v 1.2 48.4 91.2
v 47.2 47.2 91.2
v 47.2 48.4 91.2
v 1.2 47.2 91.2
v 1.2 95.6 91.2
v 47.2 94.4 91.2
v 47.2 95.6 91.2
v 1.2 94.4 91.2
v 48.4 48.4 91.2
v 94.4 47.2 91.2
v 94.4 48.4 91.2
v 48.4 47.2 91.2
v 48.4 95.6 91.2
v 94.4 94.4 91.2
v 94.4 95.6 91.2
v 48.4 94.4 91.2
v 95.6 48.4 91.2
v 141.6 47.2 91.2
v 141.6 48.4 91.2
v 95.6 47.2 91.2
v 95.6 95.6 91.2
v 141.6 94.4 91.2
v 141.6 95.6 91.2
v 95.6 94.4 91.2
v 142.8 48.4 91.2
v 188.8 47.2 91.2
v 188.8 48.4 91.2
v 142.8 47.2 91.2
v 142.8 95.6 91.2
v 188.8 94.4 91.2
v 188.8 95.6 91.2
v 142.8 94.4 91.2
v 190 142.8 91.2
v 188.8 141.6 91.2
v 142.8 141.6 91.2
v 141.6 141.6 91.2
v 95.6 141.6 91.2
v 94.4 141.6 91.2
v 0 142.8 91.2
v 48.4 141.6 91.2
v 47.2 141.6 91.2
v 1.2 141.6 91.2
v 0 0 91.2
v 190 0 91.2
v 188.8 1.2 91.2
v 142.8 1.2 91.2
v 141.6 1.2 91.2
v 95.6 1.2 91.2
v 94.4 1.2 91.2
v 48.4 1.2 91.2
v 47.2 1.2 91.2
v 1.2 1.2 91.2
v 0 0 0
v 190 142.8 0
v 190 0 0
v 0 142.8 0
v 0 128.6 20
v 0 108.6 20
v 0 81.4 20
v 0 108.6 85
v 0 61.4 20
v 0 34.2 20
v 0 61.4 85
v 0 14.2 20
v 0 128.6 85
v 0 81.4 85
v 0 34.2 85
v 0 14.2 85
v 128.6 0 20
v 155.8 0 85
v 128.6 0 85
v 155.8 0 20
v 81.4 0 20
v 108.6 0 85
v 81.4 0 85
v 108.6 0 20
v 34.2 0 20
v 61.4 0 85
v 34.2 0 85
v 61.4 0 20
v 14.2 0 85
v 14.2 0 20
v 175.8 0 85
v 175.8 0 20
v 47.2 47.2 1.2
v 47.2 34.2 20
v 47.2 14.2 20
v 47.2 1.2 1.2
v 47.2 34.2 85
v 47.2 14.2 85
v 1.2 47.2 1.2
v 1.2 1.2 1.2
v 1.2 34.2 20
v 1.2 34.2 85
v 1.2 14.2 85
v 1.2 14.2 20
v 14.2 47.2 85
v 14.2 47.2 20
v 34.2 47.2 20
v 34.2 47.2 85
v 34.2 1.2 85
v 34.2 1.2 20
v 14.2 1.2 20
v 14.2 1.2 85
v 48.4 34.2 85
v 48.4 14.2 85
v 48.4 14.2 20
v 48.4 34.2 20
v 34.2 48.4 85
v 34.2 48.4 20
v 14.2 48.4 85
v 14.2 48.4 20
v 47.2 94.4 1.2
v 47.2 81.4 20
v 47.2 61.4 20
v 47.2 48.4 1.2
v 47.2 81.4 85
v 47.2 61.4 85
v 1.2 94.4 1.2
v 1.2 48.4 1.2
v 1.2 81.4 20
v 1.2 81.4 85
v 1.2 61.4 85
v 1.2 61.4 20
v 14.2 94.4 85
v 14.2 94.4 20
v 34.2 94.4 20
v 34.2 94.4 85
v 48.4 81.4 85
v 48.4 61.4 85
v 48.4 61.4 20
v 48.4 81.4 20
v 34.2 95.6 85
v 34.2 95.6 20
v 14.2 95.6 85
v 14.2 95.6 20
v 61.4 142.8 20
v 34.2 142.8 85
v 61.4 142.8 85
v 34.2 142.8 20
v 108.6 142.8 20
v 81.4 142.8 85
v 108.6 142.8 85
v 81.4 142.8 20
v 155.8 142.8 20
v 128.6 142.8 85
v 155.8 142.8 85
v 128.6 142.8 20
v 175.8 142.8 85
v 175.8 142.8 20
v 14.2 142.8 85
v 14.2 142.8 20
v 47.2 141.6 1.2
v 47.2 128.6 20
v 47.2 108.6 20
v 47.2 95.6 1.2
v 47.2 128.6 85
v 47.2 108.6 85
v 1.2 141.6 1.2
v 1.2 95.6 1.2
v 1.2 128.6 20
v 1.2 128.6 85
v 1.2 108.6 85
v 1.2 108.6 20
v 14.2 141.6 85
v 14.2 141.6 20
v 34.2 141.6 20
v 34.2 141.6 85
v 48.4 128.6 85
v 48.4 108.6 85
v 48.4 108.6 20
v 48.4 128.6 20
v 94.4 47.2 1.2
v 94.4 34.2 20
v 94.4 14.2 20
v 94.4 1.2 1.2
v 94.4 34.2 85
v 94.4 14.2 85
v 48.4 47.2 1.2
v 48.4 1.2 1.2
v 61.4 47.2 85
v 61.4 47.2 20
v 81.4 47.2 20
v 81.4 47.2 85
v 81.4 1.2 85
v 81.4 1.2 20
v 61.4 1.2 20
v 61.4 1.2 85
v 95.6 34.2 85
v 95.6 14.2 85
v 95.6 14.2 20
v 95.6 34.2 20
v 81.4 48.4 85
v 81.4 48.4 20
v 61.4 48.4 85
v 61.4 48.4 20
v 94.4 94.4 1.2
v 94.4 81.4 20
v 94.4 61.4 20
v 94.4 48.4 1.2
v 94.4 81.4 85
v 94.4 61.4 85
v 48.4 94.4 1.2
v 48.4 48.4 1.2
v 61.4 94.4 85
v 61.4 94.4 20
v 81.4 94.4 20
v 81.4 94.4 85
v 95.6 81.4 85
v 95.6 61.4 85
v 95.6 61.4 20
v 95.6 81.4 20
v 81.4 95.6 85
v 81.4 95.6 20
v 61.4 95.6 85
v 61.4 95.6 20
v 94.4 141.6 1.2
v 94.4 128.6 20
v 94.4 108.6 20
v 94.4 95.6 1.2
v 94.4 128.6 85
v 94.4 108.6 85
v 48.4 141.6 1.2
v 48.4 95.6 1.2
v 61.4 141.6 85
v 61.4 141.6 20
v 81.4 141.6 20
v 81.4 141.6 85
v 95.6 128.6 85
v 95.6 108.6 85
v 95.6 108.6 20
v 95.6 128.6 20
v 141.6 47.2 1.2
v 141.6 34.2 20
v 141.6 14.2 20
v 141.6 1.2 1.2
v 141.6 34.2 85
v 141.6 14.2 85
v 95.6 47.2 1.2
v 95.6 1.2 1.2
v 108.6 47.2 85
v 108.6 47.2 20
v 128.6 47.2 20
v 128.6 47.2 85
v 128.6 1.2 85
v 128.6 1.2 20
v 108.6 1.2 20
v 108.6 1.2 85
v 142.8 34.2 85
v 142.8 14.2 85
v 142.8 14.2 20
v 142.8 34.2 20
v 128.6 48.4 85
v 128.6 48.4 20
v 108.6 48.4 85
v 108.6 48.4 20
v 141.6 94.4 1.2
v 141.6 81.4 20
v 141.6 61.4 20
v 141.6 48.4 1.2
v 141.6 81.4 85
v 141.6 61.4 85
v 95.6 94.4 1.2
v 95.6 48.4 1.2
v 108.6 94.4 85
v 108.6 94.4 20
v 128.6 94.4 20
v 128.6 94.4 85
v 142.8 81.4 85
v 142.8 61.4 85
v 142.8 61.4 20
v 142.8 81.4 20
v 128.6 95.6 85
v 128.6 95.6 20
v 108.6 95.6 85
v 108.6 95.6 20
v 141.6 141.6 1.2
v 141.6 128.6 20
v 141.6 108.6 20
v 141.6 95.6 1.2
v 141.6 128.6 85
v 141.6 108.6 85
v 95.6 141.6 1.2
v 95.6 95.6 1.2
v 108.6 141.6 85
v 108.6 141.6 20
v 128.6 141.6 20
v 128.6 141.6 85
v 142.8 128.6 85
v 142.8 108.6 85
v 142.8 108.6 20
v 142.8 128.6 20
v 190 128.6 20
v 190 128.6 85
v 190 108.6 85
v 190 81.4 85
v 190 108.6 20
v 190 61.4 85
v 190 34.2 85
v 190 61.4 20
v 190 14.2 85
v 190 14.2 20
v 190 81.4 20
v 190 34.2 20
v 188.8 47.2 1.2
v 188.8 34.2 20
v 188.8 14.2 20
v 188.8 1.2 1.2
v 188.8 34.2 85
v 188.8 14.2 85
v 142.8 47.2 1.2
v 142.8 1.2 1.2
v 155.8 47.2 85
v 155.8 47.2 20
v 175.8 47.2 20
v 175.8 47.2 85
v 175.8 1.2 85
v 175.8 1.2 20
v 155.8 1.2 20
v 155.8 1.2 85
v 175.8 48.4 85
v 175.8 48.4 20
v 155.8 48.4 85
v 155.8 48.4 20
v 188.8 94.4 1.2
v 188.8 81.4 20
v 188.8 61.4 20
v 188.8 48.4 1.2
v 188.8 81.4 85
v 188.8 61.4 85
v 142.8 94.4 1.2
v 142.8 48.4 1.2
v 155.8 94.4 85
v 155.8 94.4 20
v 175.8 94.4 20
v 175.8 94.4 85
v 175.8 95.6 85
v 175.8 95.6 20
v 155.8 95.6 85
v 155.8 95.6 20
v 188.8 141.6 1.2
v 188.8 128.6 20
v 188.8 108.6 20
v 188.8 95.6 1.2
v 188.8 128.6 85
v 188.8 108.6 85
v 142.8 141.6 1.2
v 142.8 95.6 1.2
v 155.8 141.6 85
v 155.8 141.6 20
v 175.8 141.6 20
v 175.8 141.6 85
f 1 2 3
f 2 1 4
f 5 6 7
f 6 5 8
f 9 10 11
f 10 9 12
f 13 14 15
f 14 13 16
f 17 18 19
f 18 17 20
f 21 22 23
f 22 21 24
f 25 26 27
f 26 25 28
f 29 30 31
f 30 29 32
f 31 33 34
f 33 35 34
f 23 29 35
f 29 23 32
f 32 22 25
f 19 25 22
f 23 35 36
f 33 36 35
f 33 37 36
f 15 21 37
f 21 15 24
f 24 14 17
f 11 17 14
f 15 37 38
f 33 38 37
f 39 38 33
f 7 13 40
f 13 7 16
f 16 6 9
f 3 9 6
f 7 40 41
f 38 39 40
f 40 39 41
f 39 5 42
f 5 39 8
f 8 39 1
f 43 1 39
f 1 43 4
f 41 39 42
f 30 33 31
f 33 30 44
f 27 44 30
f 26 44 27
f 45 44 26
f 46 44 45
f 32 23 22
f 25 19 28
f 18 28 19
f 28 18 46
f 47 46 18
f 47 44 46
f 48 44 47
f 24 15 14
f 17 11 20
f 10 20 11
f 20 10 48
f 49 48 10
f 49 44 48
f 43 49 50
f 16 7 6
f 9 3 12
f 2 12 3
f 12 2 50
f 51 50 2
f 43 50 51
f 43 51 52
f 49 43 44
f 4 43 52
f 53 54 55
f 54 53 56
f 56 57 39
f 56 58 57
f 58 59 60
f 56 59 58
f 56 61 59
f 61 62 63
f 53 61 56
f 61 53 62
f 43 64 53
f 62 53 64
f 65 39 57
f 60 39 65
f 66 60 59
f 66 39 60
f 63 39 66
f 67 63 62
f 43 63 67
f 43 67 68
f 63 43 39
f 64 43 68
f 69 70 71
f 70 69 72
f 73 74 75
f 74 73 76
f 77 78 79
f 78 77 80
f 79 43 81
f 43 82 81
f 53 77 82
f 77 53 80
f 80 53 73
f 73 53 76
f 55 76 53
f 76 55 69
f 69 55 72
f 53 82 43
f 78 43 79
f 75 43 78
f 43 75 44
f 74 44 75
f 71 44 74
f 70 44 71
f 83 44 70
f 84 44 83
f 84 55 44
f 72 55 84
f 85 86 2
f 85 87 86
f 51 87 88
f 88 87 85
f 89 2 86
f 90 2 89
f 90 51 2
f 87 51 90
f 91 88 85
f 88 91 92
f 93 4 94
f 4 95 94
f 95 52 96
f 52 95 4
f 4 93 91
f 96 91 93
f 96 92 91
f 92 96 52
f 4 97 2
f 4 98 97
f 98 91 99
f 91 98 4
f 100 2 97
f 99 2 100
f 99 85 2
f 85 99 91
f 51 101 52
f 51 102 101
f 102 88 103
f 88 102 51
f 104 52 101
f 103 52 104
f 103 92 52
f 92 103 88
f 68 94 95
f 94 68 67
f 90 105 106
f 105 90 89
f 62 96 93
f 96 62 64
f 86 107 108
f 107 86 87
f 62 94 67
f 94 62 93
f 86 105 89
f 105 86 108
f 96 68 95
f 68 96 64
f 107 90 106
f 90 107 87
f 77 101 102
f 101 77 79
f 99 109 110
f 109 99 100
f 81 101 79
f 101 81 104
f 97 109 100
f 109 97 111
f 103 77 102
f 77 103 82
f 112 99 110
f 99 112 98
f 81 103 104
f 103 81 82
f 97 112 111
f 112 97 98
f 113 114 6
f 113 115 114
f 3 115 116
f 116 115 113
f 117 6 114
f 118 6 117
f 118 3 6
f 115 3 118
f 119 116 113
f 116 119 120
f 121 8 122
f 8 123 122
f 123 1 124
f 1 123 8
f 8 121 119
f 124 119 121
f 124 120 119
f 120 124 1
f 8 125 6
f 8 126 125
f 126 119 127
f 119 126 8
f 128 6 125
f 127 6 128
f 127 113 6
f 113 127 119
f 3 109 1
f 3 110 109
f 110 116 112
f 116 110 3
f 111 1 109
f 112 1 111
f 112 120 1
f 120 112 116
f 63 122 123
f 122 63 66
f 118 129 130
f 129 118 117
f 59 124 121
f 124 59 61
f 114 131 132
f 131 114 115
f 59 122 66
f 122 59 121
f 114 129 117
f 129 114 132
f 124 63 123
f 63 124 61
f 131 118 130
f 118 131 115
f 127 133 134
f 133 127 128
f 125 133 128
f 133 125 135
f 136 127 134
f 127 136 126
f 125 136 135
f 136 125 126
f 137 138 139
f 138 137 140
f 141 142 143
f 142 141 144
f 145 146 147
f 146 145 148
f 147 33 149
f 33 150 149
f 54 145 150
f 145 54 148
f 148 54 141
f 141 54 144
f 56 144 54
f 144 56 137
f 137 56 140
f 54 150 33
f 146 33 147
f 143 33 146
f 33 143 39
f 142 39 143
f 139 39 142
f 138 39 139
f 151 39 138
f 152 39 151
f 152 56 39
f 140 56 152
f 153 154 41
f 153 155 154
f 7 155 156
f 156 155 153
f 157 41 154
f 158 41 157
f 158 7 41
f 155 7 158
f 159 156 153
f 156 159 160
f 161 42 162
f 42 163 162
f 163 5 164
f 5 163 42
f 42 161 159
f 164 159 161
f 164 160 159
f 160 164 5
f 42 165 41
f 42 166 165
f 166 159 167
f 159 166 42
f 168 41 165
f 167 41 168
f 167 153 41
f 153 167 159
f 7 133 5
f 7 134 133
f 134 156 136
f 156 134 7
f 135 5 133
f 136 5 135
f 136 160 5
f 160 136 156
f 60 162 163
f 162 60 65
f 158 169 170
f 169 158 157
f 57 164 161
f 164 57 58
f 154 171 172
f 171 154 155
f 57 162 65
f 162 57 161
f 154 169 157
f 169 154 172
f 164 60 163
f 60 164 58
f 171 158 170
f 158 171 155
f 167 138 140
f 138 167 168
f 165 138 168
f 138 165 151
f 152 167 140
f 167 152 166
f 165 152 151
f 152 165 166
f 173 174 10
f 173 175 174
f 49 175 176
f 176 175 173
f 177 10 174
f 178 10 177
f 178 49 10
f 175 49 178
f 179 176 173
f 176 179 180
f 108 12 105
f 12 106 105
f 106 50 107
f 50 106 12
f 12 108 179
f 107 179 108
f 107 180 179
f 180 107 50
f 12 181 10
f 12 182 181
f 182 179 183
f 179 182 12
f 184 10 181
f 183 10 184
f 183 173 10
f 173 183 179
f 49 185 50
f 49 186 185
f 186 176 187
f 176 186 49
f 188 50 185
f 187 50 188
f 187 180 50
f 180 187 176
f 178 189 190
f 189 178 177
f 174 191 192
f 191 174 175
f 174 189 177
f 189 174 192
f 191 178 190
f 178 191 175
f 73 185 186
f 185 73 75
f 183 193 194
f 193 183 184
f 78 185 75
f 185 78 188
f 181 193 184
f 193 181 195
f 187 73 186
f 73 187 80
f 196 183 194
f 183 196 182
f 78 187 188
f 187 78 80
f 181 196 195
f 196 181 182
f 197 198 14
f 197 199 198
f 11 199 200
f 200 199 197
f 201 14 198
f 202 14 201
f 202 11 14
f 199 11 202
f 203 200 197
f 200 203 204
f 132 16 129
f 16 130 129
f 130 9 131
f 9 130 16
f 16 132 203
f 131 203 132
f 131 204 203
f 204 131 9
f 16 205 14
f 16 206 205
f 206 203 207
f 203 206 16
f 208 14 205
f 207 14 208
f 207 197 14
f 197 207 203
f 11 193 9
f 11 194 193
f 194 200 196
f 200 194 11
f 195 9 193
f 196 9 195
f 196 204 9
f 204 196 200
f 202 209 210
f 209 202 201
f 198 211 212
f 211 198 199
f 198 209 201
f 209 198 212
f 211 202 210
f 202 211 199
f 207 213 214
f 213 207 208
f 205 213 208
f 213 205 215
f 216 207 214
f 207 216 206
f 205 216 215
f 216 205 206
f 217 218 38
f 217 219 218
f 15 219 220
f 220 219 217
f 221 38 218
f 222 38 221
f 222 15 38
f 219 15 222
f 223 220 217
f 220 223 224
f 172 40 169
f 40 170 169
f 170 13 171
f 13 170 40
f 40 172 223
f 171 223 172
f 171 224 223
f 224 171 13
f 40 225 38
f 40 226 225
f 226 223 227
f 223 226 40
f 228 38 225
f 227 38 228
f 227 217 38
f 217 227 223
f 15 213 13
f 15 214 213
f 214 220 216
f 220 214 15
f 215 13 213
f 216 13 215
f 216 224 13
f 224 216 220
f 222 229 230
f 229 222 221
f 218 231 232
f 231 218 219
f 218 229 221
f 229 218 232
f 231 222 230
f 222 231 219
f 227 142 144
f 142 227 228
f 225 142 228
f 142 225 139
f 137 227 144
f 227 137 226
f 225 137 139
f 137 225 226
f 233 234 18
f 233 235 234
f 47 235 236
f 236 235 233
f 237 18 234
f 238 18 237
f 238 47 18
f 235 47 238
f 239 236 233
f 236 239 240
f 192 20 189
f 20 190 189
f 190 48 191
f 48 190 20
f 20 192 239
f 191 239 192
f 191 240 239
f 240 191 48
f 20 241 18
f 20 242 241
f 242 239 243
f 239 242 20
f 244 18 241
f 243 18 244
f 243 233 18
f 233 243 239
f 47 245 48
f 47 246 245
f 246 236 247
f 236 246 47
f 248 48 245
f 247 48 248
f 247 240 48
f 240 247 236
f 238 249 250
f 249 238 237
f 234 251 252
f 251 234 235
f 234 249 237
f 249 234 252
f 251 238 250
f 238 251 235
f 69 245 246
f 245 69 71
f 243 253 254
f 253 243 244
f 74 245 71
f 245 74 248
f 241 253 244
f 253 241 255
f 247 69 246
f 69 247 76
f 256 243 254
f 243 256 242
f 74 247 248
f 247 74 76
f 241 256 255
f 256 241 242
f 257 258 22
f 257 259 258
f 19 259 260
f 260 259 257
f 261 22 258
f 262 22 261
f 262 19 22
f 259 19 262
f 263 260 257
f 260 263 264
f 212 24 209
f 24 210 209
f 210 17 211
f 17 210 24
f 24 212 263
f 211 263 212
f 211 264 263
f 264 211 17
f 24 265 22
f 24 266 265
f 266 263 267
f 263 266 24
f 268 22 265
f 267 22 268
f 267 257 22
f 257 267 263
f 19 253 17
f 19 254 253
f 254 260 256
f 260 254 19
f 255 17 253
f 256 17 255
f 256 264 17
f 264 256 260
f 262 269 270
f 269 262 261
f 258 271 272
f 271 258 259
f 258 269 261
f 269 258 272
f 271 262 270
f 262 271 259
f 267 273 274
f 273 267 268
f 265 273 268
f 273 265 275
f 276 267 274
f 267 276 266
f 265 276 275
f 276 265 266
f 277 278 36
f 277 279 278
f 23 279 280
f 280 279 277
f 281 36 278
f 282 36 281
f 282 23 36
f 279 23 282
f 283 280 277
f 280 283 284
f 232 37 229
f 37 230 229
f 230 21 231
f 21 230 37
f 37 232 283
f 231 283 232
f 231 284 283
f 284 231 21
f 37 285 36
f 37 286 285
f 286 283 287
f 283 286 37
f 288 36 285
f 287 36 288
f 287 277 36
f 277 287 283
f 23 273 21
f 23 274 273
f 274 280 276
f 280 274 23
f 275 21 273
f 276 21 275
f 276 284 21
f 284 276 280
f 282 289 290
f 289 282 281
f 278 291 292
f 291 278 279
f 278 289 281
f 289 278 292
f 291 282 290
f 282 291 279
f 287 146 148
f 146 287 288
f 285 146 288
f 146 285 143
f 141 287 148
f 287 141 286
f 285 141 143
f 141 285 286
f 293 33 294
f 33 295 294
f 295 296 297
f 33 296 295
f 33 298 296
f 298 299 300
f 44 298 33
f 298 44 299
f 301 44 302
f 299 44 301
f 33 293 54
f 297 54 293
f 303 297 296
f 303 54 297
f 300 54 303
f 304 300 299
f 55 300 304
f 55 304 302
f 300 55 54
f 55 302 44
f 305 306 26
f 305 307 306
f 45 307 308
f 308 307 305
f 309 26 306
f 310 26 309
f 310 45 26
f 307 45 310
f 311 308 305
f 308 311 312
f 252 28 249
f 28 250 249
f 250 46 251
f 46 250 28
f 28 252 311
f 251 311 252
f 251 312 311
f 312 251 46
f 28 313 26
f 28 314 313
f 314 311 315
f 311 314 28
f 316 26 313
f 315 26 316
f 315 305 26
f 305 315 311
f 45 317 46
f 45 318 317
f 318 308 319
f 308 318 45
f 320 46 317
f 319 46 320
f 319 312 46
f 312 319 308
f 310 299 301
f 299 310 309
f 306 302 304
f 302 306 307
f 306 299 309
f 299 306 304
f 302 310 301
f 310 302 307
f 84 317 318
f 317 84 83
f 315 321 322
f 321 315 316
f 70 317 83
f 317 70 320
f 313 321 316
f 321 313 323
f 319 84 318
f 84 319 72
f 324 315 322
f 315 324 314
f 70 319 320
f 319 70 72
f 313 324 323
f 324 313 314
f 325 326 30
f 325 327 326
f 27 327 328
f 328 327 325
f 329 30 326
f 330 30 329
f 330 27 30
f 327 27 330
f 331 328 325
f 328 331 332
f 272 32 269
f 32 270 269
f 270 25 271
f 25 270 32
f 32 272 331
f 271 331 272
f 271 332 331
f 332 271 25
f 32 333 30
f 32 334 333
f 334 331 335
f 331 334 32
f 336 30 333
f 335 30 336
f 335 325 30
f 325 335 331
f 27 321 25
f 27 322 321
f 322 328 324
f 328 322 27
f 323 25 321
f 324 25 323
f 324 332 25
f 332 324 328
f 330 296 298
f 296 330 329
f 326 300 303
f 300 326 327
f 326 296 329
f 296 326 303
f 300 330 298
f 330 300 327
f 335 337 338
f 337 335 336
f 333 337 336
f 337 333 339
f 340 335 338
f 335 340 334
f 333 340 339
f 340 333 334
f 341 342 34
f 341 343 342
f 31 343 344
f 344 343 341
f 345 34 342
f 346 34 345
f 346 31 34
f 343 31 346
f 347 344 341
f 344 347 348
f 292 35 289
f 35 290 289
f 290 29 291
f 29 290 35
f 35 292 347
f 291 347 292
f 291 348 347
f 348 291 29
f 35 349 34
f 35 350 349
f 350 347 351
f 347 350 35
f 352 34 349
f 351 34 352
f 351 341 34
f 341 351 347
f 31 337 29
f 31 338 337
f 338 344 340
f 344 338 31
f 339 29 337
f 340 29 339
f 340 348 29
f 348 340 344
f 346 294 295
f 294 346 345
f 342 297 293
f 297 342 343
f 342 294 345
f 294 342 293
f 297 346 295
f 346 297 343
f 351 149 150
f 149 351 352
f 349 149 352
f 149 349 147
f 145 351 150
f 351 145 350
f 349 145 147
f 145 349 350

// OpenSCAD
//131x45x45
wall=1.2;
height=90;
width=46;
gap_width=20;
gap_offset_height=20;
gap_top=5;

for (i=[0:3],j=[0:2]) {
    translate([(width+wall)*i,(width+wall)*j,0]) ball_box();
}
module ball_box() {
    difference() {
        cube([width+wall*2, width+wall*2, height+wall]);
        translate([wall,wall,wall]) cube([width,width,height+wall]);
        translate([0,(width-gap_width)/2+wall,gap_offset_height]) cube([width*2,gap_width,height-gap_top-gap_offset_height]);
        translate([(width-gap_width)/2+wall,0,gap_offset_height]) cube([gap_width,width*2,height-gap_top-gap_offset_height]);
    }
}
/*
for (x = [0:3]) {
    translate([0,(width+wall)*x,0]) difference() {
        cube([length+wall*2, width+wall*2, height]);
        translate([wall,wall,wall])cube([length, width, height]);
        translate([0, wall+.25*width, wall+.25*height]) cube([wall, width*.5, height]);
        translate([wall+length, wall+.25*width, wall+.25*height]) cube([wall, width*.5, height]);
    }
}
//*/
